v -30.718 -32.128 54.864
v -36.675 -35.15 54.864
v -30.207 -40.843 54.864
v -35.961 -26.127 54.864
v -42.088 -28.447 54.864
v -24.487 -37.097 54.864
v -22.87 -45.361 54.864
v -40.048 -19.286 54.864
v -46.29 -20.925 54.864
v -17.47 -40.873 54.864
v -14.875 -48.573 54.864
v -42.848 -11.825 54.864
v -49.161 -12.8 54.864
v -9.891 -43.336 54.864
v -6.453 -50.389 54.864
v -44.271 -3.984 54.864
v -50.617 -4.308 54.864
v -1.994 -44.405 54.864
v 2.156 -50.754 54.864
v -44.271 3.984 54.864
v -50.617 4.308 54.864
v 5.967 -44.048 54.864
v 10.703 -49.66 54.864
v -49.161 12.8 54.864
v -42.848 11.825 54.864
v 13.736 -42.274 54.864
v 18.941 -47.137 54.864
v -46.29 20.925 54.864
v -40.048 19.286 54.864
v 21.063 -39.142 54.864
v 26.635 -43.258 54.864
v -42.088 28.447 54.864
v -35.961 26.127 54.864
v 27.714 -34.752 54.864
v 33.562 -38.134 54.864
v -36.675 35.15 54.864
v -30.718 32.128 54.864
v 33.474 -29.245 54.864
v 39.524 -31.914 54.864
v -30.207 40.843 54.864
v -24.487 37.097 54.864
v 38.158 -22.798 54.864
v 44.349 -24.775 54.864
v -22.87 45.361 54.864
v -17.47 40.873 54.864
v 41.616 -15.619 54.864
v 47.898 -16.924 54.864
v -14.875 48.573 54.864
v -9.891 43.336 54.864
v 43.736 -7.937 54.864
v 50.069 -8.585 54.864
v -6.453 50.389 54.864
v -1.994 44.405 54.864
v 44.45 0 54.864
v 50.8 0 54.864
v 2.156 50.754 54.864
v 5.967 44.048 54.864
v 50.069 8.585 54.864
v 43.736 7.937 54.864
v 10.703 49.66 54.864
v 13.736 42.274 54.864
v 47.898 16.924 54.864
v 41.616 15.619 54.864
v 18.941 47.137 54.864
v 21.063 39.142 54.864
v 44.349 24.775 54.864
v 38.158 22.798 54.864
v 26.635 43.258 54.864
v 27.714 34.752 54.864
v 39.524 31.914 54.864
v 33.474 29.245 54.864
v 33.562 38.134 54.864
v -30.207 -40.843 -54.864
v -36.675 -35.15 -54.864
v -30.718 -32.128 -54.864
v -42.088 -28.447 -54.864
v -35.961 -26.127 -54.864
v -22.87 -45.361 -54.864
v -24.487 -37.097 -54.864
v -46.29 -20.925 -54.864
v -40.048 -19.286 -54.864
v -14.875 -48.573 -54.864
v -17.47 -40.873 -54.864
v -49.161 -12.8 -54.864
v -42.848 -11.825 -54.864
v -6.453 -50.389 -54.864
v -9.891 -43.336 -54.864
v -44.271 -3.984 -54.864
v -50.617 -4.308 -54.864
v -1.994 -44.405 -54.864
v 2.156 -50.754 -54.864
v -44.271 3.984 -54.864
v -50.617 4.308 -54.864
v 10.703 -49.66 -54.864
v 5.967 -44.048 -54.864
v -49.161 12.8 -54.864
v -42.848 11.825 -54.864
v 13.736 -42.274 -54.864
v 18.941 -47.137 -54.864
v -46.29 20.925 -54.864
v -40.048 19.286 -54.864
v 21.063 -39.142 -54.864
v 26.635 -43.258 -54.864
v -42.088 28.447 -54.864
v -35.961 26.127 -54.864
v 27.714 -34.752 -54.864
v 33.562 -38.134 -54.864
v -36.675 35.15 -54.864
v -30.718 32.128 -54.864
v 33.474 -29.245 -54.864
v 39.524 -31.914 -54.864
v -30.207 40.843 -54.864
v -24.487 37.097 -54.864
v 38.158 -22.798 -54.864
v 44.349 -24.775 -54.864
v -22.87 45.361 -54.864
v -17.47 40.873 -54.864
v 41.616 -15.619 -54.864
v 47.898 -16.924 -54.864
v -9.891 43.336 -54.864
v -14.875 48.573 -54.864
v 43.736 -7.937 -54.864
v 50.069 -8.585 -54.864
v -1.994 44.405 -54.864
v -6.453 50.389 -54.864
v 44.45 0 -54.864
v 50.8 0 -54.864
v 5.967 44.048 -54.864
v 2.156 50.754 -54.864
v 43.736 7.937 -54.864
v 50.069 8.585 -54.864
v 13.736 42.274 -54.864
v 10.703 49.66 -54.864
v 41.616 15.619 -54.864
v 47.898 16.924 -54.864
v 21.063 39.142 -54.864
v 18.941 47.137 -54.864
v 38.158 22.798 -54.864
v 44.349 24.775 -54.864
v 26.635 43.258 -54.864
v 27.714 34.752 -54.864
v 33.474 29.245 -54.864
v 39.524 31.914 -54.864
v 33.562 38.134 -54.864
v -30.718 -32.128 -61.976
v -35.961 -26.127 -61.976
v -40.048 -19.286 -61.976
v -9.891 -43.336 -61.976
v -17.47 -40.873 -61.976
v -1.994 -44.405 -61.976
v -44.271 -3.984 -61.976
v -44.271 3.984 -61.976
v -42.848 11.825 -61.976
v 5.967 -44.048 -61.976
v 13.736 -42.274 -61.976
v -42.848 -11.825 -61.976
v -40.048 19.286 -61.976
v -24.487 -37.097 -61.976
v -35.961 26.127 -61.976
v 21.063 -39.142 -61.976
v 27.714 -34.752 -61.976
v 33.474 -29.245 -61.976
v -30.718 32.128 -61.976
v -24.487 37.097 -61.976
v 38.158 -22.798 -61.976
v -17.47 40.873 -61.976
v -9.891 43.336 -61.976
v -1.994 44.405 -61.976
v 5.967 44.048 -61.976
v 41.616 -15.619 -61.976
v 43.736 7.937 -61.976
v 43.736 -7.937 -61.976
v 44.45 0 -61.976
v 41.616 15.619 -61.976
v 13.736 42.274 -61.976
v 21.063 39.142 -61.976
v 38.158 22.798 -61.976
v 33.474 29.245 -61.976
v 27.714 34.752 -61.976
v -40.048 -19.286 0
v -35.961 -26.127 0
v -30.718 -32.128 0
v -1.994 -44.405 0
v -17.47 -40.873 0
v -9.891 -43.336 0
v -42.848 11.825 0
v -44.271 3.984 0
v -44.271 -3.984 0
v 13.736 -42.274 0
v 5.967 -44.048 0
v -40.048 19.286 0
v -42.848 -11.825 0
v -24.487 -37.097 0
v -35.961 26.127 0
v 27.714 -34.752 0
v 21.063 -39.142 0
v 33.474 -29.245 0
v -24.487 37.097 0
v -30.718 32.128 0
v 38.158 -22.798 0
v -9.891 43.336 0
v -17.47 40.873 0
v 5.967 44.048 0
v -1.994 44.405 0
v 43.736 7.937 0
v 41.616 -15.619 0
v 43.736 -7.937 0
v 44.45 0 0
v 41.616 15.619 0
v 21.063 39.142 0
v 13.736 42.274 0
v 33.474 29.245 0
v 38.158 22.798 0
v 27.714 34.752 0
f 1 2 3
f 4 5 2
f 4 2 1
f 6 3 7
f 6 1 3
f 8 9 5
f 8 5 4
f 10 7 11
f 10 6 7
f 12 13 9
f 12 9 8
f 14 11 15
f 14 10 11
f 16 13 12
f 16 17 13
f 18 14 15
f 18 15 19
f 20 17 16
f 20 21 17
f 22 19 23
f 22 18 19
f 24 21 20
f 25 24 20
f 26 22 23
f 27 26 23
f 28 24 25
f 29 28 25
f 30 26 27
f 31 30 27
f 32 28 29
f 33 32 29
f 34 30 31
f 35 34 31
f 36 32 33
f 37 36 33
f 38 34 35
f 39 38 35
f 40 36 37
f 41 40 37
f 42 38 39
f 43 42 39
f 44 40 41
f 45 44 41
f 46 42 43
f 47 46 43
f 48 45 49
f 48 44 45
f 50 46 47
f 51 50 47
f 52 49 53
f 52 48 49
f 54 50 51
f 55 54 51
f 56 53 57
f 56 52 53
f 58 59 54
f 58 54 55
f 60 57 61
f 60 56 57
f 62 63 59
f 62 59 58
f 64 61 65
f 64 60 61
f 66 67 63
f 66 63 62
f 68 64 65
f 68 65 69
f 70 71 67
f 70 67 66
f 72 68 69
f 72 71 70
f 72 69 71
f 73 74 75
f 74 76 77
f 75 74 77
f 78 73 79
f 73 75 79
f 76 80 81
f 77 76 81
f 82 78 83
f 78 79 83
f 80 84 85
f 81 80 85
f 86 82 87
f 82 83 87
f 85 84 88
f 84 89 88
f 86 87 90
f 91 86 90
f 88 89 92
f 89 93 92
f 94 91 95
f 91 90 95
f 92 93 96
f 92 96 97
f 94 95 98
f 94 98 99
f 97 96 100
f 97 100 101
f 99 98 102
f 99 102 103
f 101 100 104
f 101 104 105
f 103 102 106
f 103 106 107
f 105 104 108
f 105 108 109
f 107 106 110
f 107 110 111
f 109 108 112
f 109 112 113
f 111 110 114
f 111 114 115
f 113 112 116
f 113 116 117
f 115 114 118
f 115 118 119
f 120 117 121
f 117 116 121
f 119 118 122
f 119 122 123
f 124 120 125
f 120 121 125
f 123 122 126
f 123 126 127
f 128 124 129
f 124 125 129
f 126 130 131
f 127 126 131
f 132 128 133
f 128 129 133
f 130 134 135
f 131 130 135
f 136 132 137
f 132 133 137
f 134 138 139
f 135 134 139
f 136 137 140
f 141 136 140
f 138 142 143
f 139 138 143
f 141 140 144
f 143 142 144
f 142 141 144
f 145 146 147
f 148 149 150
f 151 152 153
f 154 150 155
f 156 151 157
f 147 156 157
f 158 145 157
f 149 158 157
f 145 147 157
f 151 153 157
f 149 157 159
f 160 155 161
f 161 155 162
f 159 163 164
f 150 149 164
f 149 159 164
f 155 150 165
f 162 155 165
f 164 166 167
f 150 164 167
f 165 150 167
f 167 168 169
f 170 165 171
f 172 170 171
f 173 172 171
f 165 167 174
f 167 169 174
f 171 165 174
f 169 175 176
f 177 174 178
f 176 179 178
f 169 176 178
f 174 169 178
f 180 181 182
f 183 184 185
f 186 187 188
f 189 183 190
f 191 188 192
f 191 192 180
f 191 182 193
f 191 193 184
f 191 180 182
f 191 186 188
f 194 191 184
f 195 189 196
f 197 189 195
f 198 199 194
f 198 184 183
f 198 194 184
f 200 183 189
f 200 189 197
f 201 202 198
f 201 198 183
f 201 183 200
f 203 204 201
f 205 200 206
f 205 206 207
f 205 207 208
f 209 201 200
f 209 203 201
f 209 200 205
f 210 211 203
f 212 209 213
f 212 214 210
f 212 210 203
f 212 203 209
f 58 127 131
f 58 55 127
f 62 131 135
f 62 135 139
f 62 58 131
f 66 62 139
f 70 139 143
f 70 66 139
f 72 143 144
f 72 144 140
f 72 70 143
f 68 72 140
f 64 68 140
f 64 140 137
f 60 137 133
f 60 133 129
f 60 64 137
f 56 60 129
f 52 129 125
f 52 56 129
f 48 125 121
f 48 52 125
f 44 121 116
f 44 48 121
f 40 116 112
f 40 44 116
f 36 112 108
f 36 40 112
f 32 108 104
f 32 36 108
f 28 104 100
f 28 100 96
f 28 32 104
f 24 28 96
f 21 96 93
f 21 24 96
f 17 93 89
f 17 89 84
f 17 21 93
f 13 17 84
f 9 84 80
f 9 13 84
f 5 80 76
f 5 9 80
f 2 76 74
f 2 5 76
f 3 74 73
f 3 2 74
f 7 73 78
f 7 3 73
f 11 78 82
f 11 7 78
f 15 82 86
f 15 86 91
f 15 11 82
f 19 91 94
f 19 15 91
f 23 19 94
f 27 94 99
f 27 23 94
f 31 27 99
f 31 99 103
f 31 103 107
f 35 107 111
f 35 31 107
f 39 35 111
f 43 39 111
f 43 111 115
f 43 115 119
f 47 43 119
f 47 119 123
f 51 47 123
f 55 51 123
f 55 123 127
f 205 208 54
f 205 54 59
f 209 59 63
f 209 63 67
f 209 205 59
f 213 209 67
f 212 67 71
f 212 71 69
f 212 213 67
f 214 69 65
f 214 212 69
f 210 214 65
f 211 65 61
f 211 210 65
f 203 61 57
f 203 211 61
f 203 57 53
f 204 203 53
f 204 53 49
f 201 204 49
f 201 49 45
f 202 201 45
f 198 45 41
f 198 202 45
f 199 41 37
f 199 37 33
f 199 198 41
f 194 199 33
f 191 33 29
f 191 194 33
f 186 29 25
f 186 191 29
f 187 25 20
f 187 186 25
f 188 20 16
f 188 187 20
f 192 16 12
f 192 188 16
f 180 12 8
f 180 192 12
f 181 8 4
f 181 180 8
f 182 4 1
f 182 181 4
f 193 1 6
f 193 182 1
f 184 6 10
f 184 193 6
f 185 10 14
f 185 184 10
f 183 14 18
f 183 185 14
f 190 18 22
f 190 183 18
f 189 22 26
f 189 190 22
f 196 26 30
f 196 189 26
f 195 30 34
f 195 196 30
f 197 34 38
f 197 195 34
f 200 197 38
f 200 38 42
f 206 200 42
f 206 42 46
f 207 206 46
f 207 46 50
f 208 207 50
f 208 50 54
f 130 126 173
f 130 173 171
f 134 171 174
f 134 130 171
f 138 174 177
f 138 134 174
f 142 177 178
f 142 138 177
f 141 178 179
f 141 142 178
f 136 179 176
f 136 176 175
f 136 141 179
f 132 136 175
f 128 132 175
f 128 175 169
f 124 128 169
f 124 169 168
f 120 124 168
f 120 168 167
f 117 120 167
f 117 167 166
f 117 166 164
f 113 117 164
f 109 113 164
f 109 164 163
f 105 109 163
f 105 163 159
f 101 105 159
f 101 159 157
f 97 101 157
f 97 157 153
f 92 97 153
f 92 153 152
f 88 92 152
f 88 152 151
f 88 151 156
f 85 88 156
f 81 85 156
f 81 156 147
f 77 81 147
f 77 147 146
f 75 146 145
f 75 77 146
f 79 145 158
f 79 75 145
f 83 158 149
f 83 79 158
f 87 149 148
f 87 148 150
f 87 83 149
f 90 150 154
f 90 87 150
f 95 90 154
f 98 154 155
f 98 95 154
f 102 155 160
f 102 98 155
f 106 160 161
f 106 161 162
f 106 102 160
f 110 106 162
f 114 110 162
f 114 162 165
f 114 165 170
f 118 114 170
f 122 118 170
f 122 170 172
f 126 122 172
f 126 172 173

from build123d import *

# Parameters (mm, degrees)
F0_R     = 50.8
F0_R_2   = 44.45
F1_DEPTH = 54.864
F3_DEPTH = 61.976


# Not quite as in the source:
# - the program builds the solid bodies; features that only make, move or delete a surface that nothing else refers to are left out


with BuildPart() as f1:
    # F0 (on Top) → F1 (new body, symmetric)
    with BuildSketch(Plane.XY):
        Circle(F0_R)
        Circle(F0_R_2, mode=Mode.SUBTRACT)
    extrude(amount=F1_DEPTH, both=True)

    # F0 (on Top) → F3 (join)
    with BuildSketch(Plane.XY):
        Circle(F0_R_2)
    extrude(amount=-F3_DEPTH)


solid = f1.part
